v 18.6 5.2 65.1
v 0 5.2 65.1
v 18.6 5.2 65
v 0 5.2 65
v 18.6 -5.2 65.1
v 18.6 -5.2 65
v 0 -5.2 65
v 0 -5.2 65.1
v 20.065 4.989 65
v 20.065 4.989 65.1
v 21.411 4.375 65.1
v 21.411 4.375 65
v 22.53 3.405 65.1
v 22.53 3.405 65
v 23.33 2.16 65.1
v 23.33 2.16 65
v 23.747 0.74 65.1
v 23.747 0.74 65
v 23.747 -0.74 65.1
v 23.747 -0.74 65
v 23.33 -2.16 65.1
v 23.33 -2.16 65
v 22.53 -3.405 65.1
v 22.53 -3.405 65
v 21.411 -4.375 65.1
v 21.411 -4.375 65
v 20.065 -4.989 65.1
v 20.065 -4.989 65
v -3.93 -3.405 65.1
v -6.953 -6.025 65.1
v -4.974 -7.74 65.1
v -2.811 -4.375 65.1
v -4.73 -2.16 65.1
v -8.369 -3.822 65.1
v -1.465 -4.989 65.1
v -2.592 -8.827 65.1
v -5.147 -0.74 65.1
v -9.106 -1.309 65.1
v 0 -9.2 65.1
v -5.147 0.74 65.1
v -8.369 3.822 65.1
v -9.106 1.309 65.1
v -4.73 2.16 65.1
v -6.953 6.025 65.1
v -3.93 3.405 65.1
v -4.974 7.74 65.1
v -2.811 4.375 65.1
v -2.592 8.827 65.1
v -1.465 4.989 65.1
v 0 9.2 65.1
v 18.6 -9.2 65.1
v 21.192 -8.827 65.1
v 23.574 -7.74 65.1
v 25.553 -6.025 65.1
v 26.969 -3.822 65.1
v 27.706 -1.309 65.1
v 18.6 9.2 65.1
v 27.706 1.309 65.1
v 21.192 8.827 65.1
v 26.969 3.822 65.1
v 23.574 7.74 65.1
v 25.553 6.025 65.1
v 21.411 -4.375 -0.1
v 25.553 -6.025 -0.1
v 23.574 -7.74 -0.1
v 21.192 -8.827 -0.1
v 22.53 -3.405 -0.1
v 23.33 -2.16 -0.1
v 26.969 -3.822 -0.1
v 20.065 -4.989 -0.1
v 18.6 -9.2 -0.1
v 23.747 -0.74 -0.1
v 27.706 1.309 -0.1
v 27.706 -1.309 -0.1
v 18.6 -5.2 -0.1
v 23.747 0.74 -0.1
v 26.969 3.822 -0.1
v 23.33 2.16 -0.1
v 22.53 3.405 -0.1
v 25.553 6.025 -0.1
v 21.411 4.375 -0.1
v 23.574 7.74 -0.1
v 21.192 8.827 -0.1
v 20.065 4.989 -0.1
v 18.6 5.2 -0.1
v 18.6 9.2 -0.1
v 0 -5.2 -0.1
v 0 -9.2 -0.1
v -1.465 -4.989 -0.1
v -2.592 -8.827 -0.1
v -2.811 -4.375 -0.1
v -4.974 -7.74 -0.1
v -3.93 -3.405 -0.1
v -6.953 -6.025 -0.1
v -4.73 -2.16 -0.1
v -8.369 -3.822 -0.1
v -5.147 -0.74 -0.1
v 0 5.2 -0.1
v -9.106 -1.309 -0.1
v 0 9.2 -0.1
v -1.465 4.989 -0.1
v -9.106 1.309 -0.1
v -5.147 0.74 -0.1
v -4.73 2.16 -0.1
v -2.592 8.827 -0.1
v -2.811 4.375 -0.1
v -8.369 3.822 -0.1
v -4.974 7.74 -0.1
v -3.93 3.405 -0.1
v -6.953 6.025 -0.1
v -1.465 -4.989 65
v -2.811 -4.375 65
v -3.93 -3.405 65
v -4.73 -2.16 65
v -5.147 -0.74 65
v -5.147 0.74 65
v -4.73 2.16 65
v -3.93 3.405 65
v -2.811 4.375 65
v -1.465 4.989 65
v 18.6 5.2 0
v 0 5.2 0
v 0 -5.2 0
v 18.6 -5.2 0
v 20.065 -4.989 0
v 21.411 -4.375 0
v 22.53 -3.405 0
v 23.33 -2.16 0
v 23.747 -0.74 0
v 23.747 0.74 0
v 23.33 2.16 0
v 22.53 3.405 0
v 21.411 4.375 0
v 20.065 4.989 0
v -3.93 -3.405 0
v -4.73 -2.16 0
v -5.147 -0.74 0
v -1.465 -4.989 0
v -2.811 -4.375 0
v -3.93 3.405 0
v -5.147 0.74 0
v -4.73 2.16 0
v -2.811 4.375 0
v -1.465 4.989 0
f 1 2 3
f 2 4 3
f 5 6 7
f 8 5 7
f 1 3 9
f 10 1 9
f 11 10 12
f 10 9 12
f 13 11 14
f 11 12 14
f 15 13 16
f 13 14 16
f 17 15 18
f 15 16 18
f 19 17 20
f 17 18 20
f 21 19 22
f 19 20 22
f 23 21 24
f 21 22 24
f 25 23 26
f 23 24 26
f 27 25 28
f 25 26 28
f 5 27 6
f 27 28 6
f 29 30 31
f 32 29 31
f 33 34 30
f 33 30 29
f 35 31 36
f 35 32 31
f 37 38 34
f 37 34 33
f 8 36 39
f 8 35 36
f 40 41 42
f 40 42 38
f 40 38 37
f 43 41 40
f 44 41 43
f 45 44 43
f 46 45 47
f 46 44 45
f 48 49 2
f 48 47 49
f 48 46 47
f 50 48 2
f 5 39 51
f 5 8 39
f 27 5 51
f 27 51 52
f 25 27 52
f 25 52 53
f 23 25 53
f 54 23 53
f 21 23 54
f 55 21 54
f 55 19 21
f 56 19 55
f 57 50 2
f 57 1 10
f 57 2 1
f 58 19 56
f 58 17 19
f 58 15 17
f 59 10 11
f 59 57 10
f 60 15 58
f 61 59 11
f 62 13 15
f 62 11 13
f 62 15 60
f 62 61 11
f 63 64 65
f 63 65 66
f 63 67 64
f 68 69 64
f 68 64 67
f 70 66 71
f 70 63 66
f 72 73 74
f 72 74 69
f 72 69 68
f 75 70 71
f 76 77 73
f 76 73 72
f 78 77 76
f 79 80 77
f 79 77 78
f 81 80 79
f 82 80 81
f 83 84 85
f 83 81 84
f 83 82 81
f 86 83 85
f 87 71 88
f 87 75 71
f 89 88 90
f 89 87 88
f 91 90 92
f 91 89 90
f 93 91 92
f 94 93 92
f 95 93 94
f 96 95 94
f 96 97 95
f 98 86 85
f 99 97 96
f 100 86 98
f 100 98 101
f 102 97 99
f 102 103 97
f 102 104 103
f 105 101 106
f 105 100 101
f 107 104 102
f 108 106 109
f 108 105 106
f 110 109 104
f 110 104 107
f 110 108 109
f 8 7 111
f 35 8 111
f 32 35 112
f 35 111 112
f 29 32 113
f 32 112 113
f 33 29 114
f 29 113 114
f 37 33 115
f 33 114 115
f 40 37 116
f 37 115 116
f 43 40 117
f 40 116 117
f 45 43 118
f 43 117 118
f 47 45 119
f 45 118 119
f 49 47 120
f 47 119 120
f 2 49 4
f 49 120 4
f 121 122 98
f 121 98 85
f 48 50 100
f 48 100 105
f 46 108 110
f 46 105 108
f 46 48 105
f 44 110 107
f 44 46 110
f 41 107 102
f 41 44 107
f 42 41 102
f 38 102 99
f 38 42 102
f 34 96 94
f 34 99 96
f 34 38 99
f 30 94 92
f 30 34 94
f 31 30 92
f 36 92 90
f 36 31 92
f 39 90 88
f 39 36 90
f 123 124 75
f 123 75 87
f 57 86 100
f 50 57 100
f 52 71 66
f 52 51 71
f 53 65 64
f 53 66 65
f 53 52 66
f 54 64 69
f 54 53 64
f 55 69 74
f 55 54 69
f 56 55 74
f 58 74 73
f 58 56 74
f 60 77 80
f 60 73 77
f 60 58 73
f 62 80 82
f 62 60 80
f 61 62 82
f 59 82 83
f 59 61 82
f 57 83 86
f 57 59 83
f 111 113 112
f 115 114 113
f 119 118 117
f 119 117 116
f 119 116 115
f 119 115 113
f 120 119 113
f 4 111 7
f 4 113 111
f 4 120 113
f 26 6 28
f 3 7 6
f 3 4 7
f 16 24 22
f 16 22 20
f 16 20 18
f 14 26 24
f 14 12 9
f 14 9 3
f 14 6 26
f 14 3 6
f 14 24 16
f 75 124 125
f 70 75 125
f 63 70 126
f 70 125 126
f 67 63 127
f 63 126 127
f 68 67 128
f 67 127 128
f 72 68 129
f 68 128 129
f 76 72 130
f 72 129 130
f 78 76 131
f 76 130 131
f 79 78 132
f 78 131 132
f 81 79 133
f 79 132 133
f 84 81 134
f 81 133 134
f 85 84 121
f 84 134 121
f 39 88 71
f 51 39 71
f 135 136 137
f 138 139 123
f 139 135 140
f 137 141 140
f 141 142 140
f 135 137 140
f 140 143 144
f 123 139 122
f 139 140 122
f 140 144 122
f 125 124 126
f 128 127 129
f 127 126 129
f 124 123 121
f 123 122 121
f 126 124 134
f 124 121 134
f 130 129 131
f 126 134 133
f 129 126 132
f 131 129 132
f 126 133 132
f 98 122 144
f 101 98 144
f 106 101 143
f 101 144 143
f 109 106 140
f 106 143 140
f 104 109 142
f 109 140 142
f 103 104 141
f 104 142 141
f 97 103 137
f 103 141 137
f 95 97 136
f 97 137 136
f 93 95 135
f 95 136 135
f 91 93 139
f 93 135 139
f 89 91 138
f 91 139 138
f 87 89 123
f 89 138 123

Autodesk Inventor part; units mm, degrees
ref_plane "YZ Plane" through (0, 0, 0) normal (1, 0, 0) x (0, 1, 0)
ref_plane "XZ Plane" through (0, 0, 0) normal (0, 1, 0) x (-1, 0, 0)
ref_plane "XY Plane" through (0, 0, 0) normal (0, 0, 1) x (1, 0, 0)
sketch "Sketch1" plane through (0, 0, 0) normal (0, 0, 1) x (1, 0, 0)
  arc A0 (0, 9.2) -> (0, -9.2) centre (0, 0) ccw
  arc A1 (18.6, -9.2) -> (18.6, 9.2) centre (18.6, 0) ccw
  line L0 (0, 9.2) -> (18.6, 9.2)
  line L1 (0, -9.2) -> (18.6, -9.2)
  dimension "d0" = 18.4
  dimension "d1" = 18.4
  dimension "d2" = 18.6
extrude "Extrusion1" add sketch "Sketch1" along normal blind 65
sketch "Sketch2" plane through (0, 0, 65) normal (0, 0, 1) x (1, 0, 0)
  line L0 (18.6, 9.2) -> (0, 9.2) projected
  arc A0 (0, 9.2) -> (0, -9.2) centre (0, 0) ccw projected
  line L1 (0, -9.2) -> (18.6, -9.2) projected
  arc A1 (18.6, -9.2) -> (18.6, 9.2) centre (18.6, 0) ccw projected
  line L2 (0, 5.2) -> (18.6, 5.2)
  arc A2 (18.6, -5.2) -> (18.6, 5.2) centre (18.6, 0) ccw
  line L3 (18.6, -5.2) -> (0, -5.2)
  arc A3 (0, 5.2) -> (0, -5.2) centre (0, 0) ccw
  dimension "d7" = 4
extrude "Extrusion2" add sketch "Sketch2" along normal blind 0.1
sketch "Sketch3" plane through (0, 0, 0) normal (0, 0, -1) x (-1, 0, 0)
  line L0 (-18.6, 9.2) -> (0, 9.2) projected
  arc A0 (-18.6, 9.2) -> (-18.6, -9.2) centre (-18.6, 0) ccw projected
  line L1 (0, -9.2) -> (-18.6, -9.2) projected
  arc A1 (0, -9.2) -> (0, 9.2) centre (0, 0) ccw projected
  line L2 (0, 5.2) -> (-18.6, 5.2)
  arc A2 (-18.6, 5.2) -> (-18.6, -5.2) centre (-18.6, 0) ccw
  line L3 (-18.6, -5.2) -> (0, -5.2)
  arc A3 (0, -5.2) -> (0, 5.2) centre (0, 0) ccw
  dimension "d8" = 4
extrude "Extrusion3" add sketch "Sketch3" along normal blind 0.1
sketch "Sketch4" plane through (0, 9.2, 65.1) normal (0, 1, 0) x (1, 0, 0)
  point P0 (0, 65.1)
sketch "Sketch5" plane through (0, 9.2, 65.1) normal (0, 1, 0) x (1, 0, 0)
  line L0 (25.672, 60.4824) -> (25.672, 5.7019) construction
  line L1 (25.672, 5.7019) -> (-6.5778, 5.7019) construction
  line L2 (-6.5778, 5.7019) -> (-6.5778, 60.4824) construction
  line L3 (-6.5778, 60.4824) -> (25.672, 60.4824) construction
  point P0 (0, 65.1)
decal "Decal1"
sketch "Sketch6" plane through (0, 0, 65.1) normal (0, 0, 1) x (1, 0, 0)
  arc A0 (18.6, -5.2) -> (18.6, 5.2) centre (18.6, 0) ccw projected
  line L0 (18.6, -5.2) -> (0, -5.2) projected
  arc A1 (0, 5.2) -> (0, -5.2) centre (0, 0) ccw projected
  line L1 (0, 5.2) -> (18.6, 5.2) projected
  line L2 (18.6, 9.2) -> (0, 9.2) projected
  arc A2 (0, 9.2) -> (0, -9.2) centre (0, 0) ccw projected
  line L3 (0, -9.2) -> (18.6, -9.2) projected
  arc A3 (18.6, -9.2) -> (18.6, 9.2) centre (18.6, 0) ccw projected
properties part number "Battery Pack"
